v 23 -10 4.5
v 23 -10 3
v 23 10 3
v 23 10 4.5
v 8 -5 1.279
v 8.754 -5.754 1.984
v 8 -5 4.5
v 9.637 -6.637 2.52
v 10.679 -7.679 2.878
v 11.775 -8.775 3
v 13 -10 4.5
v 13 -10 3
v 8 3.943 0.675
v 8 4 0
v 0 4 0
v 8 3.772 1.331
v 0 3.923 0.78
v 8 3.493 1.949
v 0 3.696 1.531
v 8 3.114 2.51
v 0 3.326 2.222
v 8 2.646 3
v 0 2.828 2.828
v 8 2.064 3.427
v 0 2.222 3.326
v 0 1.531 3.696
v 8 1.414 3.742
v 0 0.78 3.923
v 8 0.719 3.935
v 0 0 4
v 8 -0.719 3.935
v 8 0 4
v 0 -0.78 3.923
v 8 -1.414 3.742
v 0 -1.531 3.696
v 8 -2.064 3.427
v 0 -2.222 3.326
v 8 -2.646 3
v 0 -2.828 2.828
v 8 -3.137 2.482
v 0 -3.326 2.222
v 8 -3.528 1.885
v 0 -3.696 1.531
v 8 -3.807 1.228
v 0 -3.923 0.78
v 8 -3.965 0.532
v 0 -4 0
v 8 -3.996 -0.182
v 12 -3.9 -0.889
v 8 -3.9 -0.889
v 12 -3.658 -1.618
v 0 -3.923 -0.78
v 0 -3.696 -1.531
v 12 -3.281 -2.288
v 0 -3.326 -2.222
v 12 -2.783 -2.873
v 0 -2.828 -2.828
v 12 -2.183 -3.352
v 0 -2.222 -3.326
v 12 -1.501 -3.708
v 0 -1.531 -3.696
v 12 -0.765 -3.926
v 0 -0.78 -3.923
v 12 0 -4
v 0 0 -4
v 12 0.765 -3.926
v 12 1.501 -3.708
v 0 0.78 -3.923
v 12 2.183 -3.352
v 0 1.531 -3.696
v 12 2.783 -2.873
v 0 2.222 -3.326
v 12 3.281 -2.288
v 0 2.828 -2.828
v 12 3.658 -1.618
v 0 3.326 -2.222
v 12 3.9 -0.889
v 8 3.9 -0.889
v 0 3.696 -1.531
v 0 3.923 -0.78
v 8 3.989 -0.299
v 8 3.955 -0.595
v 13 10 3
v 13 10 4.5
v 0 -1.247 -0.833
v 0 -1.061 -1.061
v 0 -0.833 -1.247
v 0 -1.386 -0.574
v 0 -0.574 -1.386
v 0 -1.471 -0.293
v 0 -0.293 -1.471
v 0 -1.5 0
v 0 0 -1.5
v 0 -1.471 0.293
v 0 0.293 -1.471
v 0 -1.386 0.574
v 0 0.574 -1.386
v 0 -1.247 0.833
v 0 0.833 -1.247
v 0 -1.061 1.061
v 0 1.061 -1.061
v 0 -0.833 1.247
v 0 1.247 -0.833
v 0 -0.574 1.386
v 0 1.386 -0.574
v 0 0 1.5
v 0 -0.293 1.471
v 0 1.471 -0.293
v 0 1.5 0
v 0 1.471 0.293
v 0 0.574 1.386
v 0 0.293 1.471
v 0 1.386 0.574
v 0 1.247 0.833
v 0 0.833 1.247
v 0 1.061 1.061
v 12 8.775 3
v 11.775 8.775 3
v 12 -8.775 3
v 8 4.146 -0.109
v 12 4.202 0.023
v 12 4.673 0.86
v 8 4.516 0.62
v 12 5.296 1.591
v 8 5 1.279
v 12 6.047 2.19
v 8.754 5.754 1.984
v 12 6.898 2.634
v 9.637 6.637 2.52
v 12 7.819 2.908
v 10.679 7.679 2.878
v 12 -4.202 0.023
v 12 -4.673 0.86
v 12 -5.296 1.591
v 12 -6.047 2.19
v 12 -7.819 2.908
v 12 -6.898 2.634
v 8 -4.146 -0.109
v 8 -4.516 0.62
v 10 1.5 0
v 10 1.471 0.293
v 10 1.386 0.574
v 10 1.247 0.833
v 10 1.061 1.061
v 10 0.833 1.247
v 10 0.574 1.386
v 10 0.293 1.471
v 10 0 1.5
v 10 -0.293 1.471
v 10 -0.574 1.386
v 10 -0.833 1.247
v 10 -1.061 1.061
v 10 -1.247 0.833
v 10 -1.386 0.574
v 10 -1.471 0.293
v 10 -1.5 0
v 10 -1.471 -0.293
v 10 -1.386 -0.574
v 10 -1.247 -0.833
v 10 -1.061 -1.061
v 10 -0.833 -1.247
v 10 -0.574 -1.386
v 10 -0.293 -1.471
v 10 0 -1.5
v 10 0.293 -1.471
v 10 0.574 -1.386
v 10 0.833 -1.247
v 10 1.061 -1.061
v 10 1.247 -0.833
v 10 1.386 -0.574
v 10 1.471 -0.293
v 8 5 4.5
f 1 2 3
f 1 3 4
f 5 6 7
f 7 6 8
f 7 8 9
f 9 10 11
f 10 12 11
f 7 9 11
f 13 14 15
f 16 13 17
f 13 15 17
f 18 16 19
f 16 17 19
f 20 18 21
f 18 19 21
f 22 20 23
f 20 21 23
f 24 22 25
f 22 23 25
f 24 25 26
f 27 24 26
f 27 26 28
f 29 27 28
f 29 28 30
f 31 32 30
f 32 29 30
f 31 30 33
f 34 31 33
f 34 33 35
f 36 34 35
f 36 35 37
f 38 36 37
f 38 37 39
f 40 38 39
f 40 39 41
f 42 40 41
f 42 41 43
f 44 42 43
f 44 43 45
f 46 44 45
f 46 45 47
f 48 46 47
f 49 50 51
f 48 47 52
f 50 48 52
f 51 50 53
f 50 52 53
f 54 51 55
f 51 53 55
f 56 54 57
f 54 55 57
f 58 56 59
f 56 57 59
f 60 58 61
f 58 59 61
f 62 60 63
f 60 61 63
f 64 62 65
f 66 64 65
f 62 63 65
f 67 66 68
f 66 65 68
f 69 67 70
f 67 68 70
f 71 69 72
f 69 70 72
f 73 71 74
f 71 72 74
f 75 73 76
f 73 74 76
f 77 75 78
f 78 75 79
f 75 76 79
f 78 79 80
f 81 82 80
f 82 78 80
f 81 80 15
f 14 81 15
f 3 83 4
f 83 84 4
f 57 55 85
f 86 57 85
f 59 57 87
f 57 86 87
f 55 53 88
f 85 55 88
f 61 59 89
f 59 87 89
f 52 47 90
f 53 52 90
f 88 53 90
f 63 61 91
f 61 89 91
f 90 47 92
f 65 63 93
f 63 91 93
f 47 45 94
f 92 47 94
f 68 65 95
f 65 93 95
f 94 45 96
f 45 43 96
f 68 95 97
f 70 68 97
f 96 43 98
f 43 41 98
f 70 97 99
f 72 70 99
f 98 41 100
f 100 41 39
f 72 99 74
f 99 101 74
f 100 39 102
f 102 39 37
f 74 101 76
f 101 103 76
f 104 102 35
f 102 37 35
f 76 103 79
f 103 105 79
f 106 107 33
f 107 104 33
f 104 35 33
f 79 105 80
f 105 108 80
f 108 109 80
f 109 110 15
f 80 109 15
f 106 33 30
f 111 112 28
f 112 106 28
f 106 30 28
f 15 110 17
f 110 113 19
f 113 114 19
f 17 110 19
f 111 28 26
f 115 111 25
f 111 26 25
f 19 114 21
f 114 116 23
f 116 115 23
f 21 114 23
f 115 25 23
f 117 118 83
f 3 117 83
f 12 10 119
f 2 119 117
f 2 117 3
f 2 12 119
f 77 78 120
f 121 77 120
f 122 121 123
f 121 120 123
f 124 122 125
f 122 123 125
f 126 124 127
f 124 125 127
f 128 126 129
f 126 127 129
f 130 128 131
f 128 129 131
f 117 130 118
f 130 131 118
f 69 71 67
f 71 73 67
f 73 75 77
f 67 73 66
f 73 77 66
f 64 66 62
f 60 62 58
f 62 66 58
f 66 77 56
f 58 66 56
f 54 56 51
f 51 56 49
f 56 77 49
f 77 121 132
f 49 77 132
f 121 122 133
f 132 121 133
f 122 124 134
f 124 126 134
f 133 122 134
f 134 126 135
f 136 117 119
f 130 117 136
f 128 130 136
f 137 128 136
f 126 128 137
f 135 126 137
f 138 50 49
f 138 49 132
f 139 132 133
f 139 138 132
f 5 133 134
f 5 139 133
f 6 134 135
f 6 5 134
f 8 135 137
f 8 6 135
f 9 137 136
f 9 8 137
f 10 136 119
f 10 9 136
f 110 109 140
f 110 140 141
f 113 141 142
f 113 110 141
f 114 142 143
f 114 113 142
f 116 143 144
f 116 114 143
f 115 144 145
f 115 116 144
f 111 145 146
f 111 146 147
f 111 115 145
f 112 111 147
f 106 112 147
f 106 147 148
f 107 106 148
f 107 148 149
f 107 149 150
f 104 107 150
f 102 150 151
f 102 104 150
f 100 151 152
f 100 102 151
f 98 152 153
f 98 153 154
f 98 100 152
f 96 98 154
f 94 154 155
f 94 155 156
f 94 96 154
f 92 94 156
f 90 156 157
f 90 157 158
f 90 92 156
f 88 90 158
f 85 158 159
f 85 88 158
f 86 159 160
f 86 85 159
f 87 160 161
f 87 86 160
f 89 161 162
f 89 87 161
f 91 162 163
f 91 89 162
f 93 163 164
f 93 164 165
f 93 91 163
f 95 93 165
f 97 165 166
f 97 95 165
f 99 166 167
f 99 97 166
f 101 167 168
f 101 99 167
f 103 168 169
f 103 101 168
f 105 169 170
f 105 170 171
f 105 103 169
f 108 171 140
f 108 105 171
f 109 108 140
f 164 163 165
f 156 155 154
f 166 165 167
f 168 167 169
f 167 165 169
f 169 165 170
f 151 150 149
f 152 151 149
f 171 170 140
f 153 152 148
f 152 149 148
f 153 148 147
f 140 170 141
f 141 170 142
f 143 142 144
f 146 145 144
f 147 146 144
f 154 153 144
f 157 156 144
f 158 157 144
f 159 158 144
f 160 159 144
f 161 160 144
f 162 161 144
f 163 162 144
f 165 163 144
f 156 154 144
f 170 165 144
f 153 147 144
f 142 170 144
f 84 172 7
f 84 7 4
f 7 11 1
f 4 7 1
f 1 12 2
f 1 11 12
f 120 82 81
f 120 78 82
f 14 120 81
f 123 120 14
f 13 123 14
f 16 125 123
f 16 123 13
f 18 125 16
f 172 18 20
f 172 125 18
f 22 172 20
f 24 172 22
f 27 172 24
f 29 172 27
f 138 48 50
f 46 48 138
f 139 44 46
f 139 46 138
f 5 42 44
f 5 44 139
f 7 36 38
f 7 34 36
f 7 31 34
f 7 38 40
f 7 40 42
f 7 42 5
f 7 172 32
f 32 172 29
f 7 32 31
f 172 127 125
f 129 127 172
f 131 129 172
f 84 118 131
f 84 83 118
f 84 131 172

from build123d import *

# Parameters (mm, degrees)
F0_R        = 4
F0_R_2      = 1.5
F1_DEPTH    = 10
F2_R        = 4
F3_DEPTH    = 2
F4_W        = 15
F4_H        = 1.5
F5_DEPTH    = 10
F6_T1_DEPTH = 4
F7_SIZE     = 5


# Not quite as in the source:
# - a fillet or chamfer that OpenCascade refuses, or shapes differently, is made with other operations: its cross-section is extruded or revolved along the edge and cut away or added


with BuildPart() as f1:
    # F0 (on Right) → F1 (new body)
    with BuildSketch(Plane.YZ):
        Circle(F0_R)
        Circle(F0_R_2, mode=Mode.SUBTRACT)
    extrude(amount=F1_DEPTH)

    # F2 (on face) → F3 (join)
    with BuildSketch(Plane.YZ.offset(10)):
        Circle(F2_R)
    extrude(amount=F3_DEPTH)

    # F4 (on Front) → F5 (join, symmetric)
    with BuildSketch(Plane.XZ):
        with Locations((15.5, 3.75)):
            Rectangle(F4_W, F4_H)
    extrude(amount=F5_DEPTH, both=True)

    # F6: fillet of radius 5 on 2 edges, made by hand

    # F6_s2 → F6_t1 (join)
    with BuildSketch(Plane.YZ.offset(8)):
        with BuildLine():
            ThreePointArc((-3.8999841722, -0.8888888889), (-5.6569165651, 1.9086797999), (-8.7749643874, 3))
            Line((-8.7749643874, 3), (-2.6457513111, 3))
            ThreePointArc((-2.6457513111, 3), (-3.8069052328, 1.2277917365), (-3.8999841722, -0.8888888889))
        make_face()
        with BuildLine():
            ThreePointArc((3.8999841722, -0.8888888889), (5.6569165651, 1.9086797999), (8.7749643874, 3))
            Line((8.7749643874, 3), (2.6457513111, 3))
            ThreePointArc((2.6457513111, 3), (3.8069052328, 1.2277917365), (3.8999841722, -0.8888888889))
        make_face()
    extrude(amount=F6_T1_DEPTH)

    # F7
    f7_edges = [f1.edges().sort_by_distance(p)[0] for p in [
        (8, 10, 3.75),
        (8, -10, 3.75),
    ]]
    chamfer(f7_edges, length=F7_SIZE)


solid = f1.part
